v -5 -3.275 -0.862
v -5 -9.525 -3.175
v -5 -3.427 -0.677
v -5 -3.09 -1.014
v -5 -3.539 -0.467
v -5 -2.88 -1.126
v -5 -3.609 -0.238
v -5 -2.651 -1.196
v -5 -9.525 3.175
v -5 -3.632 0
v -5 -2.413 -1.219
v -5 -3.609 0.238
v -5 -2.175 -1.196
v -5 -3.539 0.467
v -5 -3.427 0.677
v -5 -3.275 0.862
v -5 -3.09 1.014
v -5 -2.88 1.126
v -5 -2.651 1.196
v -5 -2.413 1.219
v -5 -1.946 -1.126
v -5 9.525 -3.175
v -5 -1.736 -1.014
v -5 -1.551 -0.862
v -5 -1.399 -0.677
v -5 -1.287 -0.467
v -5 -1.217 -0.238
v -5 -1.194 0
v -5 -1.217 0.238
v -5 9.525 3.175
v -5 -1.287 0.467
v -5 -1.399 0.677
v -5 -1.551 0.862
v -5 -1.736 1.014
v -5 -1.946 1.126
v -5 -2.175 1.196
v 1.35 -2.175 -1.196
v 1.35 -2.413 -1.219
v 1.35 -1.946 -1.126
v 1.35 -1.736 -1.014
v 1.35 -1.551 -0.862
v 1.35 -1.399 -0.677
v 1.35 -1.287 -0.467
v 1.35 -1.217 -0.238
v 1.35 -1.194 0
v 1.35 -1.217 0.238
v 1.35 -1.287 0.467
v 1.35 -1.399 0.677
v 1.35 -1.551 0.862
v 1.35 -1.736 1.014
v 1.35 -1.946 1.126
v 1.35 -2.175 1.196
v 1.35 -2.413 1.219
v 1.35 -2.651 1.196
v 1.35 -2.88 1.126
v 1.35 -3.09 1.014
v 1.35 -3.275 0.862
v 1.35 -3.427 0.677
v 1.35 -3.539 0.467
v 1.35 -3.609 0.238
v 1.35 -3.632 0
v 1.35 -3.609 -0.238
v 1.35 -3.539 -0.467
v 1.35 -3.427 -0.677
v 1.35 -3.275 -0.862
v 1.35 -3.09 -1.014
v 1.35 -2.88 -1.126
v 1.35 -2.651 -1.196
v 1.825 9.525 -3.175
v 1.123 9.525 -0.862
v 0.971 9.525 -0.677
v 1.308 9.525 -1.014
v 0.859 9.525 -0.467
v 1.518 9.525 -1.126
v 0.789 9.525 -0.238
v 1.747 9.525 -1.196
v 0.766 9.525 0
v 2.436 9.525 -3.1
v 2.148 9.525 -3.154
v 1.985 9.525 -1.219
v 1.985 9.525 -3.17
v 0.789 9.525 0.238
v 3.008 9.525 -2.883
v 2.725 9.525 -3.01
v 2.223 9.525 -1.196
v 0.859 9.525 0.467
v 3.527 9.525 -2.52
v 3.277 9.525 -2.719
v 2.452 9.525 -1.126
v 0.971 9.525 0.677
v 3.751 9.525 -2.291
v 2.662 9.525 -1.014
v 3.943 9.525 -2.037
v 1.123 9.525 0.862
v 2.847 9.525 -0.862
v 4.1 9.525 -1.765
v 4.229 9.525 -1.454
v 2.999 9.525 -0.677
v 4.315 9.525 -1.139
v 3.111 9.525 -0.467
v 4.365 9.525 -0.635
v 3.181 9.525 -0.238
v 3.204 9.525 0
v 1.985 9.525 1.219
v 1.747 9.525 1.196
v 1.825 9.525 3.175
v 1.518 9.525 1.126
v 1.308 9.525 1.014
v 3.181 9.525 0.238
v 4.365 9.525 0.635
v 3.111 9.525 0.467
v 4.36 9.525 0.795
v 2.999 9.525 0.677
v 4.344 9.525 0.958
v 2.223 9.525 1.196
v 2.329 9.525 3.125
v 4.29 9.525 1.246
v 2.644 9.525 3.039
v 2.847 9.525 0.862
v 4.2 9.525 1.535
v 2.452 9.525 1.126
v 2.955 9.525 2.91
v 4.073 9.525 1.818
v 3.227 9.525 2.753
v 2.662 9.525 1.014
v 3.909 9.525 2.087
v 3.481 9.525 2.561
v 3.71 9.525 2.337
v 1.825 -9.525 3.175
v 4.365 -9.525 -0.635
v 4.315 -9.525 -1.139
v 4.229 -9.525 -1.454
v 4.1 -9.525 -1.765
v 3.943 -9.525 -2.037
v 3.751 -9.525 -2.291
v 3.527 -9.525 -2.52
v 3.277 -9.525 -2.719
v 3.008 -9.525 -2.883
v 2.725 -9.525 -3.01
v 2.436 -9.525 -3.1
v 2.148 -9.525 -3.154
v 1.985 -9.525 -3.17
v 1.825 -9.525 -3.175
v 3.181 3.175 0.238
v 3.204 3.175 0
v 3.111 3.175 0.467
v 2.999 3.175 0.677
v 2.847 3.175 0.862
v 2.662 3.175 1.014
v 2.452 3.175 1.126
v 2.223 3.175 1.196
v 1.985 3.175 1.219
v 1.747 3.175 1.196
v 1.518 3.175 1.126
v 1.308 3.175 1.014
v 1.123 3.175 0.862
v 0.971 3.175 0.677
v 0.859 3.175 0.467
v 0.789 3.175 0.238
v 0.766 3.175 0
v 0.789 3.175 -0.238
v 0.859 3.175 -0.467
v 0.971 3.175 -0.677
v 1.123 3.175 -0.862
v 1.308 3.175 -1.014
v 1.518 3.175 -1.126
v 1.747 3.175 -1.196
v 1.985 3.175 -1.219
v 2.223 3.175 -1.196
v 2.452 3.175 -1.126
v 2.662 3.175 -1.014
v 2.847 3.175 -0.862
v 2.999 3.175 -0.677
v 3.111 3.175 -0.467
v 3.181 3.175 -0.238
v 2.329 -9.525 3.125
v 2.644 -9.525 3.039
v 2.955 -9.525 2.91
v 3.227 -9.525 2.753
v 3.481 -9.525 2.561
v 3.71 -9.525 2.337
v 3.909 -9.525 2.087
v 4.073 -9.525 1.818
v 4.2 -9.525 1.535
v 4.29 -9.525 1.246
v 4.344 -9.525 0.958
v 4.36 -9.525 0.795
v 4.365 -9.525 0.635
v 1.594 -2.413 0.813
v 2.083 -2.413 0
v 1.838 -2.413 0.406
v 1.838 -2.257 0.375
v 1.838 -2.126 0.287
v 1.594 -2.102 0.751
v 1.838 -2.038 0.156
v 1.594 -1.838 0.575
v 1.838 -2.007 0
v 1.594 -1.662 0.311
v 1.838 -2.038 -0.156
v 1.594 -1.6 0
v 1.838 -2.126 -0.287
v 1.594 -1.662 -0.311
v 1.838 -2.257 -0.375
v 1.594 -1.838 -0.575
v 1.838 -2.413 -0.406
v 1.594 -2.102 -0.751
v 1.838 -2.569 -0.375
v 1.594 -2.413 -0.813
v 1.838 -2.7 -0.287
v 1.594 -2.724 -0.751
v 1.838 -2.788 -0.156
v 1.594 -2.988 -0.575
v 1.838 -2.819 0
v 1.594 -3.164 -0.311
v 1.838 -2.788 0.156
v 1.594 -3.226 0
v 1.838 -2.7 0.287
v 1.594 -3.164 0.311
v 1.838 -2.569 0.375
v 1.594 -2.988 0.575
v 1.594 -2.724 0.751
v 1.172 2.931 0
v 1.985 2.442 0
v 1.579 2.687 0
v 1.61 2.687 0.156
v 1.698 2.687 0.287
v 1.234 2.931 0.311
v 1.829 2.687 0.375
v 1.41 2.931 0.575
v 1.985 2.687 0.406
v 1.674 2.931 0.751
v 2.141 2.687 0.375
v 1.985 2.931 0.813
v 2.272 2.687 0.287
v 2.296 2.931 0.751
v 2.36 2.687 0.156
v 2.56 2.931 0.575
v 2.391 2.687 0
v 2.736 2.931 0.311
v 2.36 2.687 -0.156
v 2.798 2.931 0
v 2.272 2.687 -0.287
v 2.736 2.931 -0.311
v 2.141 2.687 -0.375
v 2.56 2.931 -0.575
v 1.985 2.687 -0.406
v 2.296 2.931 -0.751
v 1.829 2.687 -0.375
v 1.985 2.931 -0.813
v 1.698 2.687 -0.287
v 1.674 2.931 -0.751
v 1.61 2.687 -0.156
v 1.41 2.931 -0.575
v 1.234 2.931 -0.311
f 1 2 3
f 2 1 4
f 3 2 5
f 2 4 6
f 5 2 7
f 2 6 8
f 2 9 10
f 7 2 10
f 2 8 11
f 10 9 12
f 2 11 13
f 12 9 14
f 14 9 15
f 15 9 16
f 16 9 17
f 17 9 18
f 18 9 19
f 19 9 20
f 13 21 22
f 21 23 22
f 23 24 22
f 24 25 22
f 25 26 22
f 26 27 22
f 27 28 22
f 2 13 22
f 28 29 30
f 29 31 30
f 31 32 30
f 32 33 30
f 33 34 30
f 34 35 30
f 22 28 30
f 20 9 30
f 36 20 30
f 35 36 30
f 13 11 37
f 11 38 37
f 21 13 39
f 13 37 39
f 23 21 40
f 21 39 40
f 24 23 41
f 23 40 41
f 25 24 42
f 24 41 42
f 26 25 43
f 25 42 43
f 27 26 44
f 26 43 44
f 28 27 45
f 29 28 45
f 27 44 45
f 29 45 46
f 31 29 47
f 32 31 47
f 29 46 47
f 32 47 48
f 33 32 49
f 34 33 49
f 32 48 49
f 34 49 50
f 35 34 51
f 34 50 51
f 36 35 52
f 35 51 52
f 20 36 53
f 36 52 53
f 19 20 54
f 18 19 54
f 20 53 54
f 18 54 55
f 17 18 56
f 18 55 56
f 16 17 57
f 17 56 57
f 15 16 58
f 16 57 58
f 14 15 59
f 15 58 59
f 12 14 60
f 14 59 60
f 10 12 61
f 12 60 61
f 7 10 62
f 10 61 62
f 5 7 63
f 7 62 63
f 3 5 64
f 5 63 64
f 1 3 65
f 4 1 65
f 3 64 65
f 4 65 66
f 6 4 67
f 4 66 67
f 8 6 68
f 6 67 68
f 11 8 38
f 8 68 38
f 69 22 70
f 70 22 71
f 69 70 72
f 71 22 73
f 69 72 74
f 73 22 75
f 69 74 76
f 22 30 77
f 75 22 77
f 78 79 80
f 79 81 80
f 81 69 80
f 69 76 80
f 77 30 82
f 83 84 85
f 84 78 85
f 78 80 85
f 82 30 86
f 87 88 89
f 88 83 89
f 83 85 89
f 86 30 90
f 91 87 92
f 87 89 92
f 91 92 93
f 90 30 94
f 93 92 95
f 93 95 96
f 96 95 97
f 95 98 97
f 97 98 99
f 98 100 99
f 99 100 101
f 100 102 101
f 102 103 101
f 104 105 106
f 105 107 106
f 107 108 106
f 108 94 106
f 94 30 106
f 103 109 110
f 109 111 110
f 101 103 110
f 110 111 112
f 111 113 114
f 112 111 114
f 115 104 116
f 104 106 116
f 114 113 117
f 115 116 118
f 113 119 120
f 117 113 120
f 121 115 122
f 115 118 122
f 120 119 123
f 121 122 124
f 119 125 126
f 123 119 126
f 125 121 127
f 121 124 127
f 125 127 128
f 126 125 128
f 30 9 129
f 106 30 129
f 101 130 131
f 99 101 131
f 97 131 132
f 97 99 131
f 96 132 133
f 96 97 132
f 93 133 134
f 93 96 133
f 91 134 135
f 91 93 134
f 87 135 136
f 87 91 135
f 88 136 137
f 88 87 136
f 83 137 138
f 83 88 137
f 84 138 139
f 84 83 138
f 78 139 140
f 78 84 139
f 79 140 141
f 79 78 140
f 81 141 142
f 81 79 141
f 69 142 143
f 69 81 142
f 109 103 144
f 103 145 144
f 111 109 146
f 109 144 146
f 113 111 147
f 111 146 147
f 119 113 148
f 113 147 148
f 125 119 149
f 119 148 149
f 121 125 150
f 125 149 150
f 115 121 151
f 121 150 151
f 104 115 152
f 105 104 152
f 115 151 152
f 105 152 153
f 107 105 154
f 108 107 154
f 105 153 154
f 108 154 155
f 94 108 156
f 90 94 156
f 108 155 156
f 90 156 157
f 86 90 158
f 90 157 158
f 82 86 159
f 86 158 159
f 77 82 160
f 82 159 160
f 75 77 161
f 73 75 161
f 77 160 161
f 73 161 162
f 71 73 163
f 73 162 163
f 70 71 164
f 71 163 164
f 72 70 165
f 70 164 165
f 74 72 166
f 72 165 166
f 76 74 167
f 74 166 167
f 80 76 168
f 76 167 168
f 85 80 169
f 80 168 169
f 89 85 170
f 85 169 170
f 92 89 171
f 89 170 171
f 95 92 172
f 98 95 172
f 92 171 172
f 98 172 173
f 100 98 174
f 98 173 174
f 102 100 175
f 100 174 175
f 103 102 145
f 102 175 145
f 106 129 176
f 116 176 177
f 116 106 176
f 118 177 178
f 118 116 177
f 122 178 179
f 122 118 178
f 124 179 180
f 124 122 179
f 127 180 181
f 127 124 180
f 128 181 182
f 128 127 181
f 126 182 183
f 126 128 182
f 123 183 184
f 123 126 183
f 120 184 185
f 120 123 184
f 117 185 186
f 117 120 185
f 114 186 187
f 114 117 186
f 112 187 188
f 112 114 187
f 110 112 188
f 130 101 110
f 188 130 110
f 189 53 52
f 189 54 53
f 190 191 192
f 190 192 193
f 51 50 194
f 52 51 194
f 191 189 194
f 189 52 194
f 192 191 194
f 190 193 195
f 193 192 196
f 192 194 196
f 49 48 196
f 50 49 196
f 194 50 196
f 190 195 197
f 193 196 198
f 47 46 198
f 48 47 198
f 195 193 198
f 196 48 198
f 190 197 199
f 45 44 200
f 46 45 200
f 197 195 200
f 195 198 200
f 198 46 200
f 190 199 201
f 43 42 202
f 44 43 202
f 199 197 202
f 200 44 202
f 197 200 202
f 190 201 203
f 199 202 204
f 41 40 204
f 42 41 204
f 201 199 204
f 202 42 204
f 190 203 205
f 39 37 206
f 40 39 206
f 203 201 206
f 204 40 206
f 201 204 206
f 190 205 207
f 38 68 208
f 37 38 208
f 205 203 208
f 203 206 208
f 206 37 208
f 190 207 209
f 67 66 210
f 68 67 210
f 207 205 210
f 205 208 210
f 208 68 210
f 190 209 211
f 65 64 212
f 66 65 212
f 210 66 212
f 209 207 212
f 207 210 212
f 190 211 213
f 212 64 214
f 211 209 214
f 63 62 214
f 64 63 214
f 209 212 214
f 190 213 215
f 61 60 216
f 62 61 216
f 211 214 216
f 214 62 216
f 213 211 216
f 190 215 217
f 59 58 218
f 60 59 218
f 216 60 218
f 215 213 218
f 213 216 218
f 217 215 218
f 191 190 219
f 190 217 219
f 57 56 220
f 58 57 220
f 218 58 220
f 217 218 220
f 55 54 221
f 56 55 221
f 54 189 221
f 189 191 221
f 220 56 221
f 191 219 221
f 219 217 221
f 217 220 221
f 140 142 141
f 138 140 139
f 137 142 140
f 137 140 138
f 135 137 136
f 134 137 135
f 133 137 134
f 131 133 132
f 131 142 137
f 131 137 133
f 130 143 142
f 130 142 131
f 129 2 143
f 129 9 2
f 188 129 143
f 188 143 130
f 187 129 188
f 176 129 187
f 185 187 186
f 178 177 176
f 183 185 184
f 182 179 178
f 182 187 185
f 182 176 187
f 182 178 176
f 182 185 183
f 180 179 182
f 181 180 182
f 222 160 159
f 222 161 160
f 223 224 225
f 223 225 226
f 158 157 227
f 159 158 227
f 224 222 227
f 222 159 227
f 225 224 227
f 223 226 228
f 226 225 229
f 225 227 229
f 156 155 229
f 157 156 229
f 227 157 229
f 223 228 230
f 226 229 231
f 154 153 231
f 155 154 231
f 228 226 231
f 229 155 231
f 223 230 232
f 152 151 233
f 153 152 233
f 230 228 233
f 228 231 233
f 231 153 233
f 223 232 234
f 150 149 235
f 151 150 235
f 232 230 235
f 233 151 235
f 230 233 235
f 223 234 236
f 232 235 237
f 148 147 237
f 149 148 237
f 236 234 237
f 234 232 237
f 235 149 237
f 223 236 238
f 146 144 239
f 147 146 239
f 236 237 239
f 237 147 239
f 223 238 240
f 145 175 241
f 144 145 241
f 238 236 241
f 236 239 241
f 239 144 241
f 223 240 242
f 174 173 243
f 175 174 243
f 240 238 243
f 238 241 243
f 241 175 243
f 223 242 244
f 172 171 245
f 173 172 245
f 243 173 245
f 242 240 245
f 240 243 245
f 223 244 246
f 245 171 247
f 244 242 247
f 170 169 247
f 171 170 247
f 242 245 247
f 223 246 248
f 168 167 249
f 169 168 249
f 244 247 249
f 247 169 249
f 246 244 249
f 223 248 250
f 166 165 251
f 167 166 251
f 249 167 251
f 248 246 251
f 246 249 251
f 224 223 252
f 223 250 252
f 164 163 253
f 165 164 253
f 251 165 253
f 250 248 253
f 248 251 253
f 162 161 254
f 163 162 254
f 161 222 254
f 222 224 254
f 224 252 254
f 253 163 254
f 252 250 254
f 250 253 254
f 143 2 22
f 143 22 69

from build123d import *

# Parameters (mm, degrees)
SKETCH1_W                 = 10
SKETCH1_H                 = 19.05
BOSS_EXTRUDE1_DEPTH       = 3.175
F_2_CLEARANCE_HOLE1_D     = 2.4384
F_2_CLEARANCE_HOLE1_DEPTH = 6.35
F_2_CLEARANCE_HOLE1_TIP   = 0.732569267
F_2_CLEARANCE_HOLE2_D     = 2.4384
F_2_CLEARANCE_HOLE2_DEPTH = 6.35
F_2_CLEARANCE_HOLE2_TIP   = 0.732569267
FILLET1_R                 = 1.5875
SKETCH7_W                 = 0.635
SKETCH7_H                 = 6.35
CUT_EXTRUDE1_DEPTH        = 20.05
FILLET2_R                 = 2.54


with BuildPart() as part:
    # Sketch1 → Boss-Extrude1 (new body, symmetric)
    with BuildSketch(Plane.XY):
        Rectangle(SKETCH1_W, SKETCH1_H)
    extrude(amount=BOSS_EXTRUDE1_DEPTH, both=True)

    # #2 Clearance Hole1
    with Locations(Plane(origin=(0, 9.525, 0), x_dir=(-1, 0, 0), z_dir=(0, 1, 0))):
        with Locations((-1.985, 0)):
            Hole(F_2_CLEARANCE_HOLE1_D / 2, depth=F_2_CLEARANCE_HOLE1_DEPTH)
            with Locations((0, 0, -(F_2_CLEARANCE_HOLE1_DEPTH + F_2_CLEARANCE_HOLE1_TIP / 2))):  # 118° drill point
                Cone(0, F_2_CLEARANCE_HOLE1_D / 2, F_2_CLEARANCE_HOLE1_TIP, mode=Mode.SUBTRACT)

    # #2 Clearance Hole2
    with Locations(Plane.ZY.offset(5)):
        with Locations((0, -2.413)):
            Hole(F_2_CLEARANCE_HOLE2_D / 2, depth=F_2_CLEARANCE_HOLE2_DEPTH)
            with Locations((0, 0, -(F_2_CLEARANCE_HOLE2_DEPTH + F_2_CLEARANCE_HOLE2_TIP / 2))):  # 118° drill point
                Cone(0, F_2_CLEARANCE_HOLE2_D / 2, F_2_CLEARANCE_HOLE2_TIP, mode=Mode.SUBTRACT)

    # Fillet1
    fillet1_edges = [part.edges().sort_by_distance(p)[0] for p in [
        (5, 0, 3.175),
        (5, 0, -3.175),
    ]]
    fillet(fillet1_edges, radius=FILLET1_R)

    # Sketch7 → Cut-Extrude1 (cut, through all)
    with BuildSketch(Plane.XZ.offset(9.525)):
        with Locations((4.6825, 0)):
            Rectangle(SKETCH7_W, SKETCH7_H)
    extrude(amount=-CUT_EXTRUDE1_DEPTH, mode=Mode.SUBTRACT)

    # Fillet2
    fillet2_edges = [part.edges().sort_by_distance(p)[0] for p in [
        (4.365, 0, -2.8575),
        (4.365, 0, 2.8575),
    ]]
    fillet(fillet2_edges, radius=FILLET2_R)


solid = part.part
